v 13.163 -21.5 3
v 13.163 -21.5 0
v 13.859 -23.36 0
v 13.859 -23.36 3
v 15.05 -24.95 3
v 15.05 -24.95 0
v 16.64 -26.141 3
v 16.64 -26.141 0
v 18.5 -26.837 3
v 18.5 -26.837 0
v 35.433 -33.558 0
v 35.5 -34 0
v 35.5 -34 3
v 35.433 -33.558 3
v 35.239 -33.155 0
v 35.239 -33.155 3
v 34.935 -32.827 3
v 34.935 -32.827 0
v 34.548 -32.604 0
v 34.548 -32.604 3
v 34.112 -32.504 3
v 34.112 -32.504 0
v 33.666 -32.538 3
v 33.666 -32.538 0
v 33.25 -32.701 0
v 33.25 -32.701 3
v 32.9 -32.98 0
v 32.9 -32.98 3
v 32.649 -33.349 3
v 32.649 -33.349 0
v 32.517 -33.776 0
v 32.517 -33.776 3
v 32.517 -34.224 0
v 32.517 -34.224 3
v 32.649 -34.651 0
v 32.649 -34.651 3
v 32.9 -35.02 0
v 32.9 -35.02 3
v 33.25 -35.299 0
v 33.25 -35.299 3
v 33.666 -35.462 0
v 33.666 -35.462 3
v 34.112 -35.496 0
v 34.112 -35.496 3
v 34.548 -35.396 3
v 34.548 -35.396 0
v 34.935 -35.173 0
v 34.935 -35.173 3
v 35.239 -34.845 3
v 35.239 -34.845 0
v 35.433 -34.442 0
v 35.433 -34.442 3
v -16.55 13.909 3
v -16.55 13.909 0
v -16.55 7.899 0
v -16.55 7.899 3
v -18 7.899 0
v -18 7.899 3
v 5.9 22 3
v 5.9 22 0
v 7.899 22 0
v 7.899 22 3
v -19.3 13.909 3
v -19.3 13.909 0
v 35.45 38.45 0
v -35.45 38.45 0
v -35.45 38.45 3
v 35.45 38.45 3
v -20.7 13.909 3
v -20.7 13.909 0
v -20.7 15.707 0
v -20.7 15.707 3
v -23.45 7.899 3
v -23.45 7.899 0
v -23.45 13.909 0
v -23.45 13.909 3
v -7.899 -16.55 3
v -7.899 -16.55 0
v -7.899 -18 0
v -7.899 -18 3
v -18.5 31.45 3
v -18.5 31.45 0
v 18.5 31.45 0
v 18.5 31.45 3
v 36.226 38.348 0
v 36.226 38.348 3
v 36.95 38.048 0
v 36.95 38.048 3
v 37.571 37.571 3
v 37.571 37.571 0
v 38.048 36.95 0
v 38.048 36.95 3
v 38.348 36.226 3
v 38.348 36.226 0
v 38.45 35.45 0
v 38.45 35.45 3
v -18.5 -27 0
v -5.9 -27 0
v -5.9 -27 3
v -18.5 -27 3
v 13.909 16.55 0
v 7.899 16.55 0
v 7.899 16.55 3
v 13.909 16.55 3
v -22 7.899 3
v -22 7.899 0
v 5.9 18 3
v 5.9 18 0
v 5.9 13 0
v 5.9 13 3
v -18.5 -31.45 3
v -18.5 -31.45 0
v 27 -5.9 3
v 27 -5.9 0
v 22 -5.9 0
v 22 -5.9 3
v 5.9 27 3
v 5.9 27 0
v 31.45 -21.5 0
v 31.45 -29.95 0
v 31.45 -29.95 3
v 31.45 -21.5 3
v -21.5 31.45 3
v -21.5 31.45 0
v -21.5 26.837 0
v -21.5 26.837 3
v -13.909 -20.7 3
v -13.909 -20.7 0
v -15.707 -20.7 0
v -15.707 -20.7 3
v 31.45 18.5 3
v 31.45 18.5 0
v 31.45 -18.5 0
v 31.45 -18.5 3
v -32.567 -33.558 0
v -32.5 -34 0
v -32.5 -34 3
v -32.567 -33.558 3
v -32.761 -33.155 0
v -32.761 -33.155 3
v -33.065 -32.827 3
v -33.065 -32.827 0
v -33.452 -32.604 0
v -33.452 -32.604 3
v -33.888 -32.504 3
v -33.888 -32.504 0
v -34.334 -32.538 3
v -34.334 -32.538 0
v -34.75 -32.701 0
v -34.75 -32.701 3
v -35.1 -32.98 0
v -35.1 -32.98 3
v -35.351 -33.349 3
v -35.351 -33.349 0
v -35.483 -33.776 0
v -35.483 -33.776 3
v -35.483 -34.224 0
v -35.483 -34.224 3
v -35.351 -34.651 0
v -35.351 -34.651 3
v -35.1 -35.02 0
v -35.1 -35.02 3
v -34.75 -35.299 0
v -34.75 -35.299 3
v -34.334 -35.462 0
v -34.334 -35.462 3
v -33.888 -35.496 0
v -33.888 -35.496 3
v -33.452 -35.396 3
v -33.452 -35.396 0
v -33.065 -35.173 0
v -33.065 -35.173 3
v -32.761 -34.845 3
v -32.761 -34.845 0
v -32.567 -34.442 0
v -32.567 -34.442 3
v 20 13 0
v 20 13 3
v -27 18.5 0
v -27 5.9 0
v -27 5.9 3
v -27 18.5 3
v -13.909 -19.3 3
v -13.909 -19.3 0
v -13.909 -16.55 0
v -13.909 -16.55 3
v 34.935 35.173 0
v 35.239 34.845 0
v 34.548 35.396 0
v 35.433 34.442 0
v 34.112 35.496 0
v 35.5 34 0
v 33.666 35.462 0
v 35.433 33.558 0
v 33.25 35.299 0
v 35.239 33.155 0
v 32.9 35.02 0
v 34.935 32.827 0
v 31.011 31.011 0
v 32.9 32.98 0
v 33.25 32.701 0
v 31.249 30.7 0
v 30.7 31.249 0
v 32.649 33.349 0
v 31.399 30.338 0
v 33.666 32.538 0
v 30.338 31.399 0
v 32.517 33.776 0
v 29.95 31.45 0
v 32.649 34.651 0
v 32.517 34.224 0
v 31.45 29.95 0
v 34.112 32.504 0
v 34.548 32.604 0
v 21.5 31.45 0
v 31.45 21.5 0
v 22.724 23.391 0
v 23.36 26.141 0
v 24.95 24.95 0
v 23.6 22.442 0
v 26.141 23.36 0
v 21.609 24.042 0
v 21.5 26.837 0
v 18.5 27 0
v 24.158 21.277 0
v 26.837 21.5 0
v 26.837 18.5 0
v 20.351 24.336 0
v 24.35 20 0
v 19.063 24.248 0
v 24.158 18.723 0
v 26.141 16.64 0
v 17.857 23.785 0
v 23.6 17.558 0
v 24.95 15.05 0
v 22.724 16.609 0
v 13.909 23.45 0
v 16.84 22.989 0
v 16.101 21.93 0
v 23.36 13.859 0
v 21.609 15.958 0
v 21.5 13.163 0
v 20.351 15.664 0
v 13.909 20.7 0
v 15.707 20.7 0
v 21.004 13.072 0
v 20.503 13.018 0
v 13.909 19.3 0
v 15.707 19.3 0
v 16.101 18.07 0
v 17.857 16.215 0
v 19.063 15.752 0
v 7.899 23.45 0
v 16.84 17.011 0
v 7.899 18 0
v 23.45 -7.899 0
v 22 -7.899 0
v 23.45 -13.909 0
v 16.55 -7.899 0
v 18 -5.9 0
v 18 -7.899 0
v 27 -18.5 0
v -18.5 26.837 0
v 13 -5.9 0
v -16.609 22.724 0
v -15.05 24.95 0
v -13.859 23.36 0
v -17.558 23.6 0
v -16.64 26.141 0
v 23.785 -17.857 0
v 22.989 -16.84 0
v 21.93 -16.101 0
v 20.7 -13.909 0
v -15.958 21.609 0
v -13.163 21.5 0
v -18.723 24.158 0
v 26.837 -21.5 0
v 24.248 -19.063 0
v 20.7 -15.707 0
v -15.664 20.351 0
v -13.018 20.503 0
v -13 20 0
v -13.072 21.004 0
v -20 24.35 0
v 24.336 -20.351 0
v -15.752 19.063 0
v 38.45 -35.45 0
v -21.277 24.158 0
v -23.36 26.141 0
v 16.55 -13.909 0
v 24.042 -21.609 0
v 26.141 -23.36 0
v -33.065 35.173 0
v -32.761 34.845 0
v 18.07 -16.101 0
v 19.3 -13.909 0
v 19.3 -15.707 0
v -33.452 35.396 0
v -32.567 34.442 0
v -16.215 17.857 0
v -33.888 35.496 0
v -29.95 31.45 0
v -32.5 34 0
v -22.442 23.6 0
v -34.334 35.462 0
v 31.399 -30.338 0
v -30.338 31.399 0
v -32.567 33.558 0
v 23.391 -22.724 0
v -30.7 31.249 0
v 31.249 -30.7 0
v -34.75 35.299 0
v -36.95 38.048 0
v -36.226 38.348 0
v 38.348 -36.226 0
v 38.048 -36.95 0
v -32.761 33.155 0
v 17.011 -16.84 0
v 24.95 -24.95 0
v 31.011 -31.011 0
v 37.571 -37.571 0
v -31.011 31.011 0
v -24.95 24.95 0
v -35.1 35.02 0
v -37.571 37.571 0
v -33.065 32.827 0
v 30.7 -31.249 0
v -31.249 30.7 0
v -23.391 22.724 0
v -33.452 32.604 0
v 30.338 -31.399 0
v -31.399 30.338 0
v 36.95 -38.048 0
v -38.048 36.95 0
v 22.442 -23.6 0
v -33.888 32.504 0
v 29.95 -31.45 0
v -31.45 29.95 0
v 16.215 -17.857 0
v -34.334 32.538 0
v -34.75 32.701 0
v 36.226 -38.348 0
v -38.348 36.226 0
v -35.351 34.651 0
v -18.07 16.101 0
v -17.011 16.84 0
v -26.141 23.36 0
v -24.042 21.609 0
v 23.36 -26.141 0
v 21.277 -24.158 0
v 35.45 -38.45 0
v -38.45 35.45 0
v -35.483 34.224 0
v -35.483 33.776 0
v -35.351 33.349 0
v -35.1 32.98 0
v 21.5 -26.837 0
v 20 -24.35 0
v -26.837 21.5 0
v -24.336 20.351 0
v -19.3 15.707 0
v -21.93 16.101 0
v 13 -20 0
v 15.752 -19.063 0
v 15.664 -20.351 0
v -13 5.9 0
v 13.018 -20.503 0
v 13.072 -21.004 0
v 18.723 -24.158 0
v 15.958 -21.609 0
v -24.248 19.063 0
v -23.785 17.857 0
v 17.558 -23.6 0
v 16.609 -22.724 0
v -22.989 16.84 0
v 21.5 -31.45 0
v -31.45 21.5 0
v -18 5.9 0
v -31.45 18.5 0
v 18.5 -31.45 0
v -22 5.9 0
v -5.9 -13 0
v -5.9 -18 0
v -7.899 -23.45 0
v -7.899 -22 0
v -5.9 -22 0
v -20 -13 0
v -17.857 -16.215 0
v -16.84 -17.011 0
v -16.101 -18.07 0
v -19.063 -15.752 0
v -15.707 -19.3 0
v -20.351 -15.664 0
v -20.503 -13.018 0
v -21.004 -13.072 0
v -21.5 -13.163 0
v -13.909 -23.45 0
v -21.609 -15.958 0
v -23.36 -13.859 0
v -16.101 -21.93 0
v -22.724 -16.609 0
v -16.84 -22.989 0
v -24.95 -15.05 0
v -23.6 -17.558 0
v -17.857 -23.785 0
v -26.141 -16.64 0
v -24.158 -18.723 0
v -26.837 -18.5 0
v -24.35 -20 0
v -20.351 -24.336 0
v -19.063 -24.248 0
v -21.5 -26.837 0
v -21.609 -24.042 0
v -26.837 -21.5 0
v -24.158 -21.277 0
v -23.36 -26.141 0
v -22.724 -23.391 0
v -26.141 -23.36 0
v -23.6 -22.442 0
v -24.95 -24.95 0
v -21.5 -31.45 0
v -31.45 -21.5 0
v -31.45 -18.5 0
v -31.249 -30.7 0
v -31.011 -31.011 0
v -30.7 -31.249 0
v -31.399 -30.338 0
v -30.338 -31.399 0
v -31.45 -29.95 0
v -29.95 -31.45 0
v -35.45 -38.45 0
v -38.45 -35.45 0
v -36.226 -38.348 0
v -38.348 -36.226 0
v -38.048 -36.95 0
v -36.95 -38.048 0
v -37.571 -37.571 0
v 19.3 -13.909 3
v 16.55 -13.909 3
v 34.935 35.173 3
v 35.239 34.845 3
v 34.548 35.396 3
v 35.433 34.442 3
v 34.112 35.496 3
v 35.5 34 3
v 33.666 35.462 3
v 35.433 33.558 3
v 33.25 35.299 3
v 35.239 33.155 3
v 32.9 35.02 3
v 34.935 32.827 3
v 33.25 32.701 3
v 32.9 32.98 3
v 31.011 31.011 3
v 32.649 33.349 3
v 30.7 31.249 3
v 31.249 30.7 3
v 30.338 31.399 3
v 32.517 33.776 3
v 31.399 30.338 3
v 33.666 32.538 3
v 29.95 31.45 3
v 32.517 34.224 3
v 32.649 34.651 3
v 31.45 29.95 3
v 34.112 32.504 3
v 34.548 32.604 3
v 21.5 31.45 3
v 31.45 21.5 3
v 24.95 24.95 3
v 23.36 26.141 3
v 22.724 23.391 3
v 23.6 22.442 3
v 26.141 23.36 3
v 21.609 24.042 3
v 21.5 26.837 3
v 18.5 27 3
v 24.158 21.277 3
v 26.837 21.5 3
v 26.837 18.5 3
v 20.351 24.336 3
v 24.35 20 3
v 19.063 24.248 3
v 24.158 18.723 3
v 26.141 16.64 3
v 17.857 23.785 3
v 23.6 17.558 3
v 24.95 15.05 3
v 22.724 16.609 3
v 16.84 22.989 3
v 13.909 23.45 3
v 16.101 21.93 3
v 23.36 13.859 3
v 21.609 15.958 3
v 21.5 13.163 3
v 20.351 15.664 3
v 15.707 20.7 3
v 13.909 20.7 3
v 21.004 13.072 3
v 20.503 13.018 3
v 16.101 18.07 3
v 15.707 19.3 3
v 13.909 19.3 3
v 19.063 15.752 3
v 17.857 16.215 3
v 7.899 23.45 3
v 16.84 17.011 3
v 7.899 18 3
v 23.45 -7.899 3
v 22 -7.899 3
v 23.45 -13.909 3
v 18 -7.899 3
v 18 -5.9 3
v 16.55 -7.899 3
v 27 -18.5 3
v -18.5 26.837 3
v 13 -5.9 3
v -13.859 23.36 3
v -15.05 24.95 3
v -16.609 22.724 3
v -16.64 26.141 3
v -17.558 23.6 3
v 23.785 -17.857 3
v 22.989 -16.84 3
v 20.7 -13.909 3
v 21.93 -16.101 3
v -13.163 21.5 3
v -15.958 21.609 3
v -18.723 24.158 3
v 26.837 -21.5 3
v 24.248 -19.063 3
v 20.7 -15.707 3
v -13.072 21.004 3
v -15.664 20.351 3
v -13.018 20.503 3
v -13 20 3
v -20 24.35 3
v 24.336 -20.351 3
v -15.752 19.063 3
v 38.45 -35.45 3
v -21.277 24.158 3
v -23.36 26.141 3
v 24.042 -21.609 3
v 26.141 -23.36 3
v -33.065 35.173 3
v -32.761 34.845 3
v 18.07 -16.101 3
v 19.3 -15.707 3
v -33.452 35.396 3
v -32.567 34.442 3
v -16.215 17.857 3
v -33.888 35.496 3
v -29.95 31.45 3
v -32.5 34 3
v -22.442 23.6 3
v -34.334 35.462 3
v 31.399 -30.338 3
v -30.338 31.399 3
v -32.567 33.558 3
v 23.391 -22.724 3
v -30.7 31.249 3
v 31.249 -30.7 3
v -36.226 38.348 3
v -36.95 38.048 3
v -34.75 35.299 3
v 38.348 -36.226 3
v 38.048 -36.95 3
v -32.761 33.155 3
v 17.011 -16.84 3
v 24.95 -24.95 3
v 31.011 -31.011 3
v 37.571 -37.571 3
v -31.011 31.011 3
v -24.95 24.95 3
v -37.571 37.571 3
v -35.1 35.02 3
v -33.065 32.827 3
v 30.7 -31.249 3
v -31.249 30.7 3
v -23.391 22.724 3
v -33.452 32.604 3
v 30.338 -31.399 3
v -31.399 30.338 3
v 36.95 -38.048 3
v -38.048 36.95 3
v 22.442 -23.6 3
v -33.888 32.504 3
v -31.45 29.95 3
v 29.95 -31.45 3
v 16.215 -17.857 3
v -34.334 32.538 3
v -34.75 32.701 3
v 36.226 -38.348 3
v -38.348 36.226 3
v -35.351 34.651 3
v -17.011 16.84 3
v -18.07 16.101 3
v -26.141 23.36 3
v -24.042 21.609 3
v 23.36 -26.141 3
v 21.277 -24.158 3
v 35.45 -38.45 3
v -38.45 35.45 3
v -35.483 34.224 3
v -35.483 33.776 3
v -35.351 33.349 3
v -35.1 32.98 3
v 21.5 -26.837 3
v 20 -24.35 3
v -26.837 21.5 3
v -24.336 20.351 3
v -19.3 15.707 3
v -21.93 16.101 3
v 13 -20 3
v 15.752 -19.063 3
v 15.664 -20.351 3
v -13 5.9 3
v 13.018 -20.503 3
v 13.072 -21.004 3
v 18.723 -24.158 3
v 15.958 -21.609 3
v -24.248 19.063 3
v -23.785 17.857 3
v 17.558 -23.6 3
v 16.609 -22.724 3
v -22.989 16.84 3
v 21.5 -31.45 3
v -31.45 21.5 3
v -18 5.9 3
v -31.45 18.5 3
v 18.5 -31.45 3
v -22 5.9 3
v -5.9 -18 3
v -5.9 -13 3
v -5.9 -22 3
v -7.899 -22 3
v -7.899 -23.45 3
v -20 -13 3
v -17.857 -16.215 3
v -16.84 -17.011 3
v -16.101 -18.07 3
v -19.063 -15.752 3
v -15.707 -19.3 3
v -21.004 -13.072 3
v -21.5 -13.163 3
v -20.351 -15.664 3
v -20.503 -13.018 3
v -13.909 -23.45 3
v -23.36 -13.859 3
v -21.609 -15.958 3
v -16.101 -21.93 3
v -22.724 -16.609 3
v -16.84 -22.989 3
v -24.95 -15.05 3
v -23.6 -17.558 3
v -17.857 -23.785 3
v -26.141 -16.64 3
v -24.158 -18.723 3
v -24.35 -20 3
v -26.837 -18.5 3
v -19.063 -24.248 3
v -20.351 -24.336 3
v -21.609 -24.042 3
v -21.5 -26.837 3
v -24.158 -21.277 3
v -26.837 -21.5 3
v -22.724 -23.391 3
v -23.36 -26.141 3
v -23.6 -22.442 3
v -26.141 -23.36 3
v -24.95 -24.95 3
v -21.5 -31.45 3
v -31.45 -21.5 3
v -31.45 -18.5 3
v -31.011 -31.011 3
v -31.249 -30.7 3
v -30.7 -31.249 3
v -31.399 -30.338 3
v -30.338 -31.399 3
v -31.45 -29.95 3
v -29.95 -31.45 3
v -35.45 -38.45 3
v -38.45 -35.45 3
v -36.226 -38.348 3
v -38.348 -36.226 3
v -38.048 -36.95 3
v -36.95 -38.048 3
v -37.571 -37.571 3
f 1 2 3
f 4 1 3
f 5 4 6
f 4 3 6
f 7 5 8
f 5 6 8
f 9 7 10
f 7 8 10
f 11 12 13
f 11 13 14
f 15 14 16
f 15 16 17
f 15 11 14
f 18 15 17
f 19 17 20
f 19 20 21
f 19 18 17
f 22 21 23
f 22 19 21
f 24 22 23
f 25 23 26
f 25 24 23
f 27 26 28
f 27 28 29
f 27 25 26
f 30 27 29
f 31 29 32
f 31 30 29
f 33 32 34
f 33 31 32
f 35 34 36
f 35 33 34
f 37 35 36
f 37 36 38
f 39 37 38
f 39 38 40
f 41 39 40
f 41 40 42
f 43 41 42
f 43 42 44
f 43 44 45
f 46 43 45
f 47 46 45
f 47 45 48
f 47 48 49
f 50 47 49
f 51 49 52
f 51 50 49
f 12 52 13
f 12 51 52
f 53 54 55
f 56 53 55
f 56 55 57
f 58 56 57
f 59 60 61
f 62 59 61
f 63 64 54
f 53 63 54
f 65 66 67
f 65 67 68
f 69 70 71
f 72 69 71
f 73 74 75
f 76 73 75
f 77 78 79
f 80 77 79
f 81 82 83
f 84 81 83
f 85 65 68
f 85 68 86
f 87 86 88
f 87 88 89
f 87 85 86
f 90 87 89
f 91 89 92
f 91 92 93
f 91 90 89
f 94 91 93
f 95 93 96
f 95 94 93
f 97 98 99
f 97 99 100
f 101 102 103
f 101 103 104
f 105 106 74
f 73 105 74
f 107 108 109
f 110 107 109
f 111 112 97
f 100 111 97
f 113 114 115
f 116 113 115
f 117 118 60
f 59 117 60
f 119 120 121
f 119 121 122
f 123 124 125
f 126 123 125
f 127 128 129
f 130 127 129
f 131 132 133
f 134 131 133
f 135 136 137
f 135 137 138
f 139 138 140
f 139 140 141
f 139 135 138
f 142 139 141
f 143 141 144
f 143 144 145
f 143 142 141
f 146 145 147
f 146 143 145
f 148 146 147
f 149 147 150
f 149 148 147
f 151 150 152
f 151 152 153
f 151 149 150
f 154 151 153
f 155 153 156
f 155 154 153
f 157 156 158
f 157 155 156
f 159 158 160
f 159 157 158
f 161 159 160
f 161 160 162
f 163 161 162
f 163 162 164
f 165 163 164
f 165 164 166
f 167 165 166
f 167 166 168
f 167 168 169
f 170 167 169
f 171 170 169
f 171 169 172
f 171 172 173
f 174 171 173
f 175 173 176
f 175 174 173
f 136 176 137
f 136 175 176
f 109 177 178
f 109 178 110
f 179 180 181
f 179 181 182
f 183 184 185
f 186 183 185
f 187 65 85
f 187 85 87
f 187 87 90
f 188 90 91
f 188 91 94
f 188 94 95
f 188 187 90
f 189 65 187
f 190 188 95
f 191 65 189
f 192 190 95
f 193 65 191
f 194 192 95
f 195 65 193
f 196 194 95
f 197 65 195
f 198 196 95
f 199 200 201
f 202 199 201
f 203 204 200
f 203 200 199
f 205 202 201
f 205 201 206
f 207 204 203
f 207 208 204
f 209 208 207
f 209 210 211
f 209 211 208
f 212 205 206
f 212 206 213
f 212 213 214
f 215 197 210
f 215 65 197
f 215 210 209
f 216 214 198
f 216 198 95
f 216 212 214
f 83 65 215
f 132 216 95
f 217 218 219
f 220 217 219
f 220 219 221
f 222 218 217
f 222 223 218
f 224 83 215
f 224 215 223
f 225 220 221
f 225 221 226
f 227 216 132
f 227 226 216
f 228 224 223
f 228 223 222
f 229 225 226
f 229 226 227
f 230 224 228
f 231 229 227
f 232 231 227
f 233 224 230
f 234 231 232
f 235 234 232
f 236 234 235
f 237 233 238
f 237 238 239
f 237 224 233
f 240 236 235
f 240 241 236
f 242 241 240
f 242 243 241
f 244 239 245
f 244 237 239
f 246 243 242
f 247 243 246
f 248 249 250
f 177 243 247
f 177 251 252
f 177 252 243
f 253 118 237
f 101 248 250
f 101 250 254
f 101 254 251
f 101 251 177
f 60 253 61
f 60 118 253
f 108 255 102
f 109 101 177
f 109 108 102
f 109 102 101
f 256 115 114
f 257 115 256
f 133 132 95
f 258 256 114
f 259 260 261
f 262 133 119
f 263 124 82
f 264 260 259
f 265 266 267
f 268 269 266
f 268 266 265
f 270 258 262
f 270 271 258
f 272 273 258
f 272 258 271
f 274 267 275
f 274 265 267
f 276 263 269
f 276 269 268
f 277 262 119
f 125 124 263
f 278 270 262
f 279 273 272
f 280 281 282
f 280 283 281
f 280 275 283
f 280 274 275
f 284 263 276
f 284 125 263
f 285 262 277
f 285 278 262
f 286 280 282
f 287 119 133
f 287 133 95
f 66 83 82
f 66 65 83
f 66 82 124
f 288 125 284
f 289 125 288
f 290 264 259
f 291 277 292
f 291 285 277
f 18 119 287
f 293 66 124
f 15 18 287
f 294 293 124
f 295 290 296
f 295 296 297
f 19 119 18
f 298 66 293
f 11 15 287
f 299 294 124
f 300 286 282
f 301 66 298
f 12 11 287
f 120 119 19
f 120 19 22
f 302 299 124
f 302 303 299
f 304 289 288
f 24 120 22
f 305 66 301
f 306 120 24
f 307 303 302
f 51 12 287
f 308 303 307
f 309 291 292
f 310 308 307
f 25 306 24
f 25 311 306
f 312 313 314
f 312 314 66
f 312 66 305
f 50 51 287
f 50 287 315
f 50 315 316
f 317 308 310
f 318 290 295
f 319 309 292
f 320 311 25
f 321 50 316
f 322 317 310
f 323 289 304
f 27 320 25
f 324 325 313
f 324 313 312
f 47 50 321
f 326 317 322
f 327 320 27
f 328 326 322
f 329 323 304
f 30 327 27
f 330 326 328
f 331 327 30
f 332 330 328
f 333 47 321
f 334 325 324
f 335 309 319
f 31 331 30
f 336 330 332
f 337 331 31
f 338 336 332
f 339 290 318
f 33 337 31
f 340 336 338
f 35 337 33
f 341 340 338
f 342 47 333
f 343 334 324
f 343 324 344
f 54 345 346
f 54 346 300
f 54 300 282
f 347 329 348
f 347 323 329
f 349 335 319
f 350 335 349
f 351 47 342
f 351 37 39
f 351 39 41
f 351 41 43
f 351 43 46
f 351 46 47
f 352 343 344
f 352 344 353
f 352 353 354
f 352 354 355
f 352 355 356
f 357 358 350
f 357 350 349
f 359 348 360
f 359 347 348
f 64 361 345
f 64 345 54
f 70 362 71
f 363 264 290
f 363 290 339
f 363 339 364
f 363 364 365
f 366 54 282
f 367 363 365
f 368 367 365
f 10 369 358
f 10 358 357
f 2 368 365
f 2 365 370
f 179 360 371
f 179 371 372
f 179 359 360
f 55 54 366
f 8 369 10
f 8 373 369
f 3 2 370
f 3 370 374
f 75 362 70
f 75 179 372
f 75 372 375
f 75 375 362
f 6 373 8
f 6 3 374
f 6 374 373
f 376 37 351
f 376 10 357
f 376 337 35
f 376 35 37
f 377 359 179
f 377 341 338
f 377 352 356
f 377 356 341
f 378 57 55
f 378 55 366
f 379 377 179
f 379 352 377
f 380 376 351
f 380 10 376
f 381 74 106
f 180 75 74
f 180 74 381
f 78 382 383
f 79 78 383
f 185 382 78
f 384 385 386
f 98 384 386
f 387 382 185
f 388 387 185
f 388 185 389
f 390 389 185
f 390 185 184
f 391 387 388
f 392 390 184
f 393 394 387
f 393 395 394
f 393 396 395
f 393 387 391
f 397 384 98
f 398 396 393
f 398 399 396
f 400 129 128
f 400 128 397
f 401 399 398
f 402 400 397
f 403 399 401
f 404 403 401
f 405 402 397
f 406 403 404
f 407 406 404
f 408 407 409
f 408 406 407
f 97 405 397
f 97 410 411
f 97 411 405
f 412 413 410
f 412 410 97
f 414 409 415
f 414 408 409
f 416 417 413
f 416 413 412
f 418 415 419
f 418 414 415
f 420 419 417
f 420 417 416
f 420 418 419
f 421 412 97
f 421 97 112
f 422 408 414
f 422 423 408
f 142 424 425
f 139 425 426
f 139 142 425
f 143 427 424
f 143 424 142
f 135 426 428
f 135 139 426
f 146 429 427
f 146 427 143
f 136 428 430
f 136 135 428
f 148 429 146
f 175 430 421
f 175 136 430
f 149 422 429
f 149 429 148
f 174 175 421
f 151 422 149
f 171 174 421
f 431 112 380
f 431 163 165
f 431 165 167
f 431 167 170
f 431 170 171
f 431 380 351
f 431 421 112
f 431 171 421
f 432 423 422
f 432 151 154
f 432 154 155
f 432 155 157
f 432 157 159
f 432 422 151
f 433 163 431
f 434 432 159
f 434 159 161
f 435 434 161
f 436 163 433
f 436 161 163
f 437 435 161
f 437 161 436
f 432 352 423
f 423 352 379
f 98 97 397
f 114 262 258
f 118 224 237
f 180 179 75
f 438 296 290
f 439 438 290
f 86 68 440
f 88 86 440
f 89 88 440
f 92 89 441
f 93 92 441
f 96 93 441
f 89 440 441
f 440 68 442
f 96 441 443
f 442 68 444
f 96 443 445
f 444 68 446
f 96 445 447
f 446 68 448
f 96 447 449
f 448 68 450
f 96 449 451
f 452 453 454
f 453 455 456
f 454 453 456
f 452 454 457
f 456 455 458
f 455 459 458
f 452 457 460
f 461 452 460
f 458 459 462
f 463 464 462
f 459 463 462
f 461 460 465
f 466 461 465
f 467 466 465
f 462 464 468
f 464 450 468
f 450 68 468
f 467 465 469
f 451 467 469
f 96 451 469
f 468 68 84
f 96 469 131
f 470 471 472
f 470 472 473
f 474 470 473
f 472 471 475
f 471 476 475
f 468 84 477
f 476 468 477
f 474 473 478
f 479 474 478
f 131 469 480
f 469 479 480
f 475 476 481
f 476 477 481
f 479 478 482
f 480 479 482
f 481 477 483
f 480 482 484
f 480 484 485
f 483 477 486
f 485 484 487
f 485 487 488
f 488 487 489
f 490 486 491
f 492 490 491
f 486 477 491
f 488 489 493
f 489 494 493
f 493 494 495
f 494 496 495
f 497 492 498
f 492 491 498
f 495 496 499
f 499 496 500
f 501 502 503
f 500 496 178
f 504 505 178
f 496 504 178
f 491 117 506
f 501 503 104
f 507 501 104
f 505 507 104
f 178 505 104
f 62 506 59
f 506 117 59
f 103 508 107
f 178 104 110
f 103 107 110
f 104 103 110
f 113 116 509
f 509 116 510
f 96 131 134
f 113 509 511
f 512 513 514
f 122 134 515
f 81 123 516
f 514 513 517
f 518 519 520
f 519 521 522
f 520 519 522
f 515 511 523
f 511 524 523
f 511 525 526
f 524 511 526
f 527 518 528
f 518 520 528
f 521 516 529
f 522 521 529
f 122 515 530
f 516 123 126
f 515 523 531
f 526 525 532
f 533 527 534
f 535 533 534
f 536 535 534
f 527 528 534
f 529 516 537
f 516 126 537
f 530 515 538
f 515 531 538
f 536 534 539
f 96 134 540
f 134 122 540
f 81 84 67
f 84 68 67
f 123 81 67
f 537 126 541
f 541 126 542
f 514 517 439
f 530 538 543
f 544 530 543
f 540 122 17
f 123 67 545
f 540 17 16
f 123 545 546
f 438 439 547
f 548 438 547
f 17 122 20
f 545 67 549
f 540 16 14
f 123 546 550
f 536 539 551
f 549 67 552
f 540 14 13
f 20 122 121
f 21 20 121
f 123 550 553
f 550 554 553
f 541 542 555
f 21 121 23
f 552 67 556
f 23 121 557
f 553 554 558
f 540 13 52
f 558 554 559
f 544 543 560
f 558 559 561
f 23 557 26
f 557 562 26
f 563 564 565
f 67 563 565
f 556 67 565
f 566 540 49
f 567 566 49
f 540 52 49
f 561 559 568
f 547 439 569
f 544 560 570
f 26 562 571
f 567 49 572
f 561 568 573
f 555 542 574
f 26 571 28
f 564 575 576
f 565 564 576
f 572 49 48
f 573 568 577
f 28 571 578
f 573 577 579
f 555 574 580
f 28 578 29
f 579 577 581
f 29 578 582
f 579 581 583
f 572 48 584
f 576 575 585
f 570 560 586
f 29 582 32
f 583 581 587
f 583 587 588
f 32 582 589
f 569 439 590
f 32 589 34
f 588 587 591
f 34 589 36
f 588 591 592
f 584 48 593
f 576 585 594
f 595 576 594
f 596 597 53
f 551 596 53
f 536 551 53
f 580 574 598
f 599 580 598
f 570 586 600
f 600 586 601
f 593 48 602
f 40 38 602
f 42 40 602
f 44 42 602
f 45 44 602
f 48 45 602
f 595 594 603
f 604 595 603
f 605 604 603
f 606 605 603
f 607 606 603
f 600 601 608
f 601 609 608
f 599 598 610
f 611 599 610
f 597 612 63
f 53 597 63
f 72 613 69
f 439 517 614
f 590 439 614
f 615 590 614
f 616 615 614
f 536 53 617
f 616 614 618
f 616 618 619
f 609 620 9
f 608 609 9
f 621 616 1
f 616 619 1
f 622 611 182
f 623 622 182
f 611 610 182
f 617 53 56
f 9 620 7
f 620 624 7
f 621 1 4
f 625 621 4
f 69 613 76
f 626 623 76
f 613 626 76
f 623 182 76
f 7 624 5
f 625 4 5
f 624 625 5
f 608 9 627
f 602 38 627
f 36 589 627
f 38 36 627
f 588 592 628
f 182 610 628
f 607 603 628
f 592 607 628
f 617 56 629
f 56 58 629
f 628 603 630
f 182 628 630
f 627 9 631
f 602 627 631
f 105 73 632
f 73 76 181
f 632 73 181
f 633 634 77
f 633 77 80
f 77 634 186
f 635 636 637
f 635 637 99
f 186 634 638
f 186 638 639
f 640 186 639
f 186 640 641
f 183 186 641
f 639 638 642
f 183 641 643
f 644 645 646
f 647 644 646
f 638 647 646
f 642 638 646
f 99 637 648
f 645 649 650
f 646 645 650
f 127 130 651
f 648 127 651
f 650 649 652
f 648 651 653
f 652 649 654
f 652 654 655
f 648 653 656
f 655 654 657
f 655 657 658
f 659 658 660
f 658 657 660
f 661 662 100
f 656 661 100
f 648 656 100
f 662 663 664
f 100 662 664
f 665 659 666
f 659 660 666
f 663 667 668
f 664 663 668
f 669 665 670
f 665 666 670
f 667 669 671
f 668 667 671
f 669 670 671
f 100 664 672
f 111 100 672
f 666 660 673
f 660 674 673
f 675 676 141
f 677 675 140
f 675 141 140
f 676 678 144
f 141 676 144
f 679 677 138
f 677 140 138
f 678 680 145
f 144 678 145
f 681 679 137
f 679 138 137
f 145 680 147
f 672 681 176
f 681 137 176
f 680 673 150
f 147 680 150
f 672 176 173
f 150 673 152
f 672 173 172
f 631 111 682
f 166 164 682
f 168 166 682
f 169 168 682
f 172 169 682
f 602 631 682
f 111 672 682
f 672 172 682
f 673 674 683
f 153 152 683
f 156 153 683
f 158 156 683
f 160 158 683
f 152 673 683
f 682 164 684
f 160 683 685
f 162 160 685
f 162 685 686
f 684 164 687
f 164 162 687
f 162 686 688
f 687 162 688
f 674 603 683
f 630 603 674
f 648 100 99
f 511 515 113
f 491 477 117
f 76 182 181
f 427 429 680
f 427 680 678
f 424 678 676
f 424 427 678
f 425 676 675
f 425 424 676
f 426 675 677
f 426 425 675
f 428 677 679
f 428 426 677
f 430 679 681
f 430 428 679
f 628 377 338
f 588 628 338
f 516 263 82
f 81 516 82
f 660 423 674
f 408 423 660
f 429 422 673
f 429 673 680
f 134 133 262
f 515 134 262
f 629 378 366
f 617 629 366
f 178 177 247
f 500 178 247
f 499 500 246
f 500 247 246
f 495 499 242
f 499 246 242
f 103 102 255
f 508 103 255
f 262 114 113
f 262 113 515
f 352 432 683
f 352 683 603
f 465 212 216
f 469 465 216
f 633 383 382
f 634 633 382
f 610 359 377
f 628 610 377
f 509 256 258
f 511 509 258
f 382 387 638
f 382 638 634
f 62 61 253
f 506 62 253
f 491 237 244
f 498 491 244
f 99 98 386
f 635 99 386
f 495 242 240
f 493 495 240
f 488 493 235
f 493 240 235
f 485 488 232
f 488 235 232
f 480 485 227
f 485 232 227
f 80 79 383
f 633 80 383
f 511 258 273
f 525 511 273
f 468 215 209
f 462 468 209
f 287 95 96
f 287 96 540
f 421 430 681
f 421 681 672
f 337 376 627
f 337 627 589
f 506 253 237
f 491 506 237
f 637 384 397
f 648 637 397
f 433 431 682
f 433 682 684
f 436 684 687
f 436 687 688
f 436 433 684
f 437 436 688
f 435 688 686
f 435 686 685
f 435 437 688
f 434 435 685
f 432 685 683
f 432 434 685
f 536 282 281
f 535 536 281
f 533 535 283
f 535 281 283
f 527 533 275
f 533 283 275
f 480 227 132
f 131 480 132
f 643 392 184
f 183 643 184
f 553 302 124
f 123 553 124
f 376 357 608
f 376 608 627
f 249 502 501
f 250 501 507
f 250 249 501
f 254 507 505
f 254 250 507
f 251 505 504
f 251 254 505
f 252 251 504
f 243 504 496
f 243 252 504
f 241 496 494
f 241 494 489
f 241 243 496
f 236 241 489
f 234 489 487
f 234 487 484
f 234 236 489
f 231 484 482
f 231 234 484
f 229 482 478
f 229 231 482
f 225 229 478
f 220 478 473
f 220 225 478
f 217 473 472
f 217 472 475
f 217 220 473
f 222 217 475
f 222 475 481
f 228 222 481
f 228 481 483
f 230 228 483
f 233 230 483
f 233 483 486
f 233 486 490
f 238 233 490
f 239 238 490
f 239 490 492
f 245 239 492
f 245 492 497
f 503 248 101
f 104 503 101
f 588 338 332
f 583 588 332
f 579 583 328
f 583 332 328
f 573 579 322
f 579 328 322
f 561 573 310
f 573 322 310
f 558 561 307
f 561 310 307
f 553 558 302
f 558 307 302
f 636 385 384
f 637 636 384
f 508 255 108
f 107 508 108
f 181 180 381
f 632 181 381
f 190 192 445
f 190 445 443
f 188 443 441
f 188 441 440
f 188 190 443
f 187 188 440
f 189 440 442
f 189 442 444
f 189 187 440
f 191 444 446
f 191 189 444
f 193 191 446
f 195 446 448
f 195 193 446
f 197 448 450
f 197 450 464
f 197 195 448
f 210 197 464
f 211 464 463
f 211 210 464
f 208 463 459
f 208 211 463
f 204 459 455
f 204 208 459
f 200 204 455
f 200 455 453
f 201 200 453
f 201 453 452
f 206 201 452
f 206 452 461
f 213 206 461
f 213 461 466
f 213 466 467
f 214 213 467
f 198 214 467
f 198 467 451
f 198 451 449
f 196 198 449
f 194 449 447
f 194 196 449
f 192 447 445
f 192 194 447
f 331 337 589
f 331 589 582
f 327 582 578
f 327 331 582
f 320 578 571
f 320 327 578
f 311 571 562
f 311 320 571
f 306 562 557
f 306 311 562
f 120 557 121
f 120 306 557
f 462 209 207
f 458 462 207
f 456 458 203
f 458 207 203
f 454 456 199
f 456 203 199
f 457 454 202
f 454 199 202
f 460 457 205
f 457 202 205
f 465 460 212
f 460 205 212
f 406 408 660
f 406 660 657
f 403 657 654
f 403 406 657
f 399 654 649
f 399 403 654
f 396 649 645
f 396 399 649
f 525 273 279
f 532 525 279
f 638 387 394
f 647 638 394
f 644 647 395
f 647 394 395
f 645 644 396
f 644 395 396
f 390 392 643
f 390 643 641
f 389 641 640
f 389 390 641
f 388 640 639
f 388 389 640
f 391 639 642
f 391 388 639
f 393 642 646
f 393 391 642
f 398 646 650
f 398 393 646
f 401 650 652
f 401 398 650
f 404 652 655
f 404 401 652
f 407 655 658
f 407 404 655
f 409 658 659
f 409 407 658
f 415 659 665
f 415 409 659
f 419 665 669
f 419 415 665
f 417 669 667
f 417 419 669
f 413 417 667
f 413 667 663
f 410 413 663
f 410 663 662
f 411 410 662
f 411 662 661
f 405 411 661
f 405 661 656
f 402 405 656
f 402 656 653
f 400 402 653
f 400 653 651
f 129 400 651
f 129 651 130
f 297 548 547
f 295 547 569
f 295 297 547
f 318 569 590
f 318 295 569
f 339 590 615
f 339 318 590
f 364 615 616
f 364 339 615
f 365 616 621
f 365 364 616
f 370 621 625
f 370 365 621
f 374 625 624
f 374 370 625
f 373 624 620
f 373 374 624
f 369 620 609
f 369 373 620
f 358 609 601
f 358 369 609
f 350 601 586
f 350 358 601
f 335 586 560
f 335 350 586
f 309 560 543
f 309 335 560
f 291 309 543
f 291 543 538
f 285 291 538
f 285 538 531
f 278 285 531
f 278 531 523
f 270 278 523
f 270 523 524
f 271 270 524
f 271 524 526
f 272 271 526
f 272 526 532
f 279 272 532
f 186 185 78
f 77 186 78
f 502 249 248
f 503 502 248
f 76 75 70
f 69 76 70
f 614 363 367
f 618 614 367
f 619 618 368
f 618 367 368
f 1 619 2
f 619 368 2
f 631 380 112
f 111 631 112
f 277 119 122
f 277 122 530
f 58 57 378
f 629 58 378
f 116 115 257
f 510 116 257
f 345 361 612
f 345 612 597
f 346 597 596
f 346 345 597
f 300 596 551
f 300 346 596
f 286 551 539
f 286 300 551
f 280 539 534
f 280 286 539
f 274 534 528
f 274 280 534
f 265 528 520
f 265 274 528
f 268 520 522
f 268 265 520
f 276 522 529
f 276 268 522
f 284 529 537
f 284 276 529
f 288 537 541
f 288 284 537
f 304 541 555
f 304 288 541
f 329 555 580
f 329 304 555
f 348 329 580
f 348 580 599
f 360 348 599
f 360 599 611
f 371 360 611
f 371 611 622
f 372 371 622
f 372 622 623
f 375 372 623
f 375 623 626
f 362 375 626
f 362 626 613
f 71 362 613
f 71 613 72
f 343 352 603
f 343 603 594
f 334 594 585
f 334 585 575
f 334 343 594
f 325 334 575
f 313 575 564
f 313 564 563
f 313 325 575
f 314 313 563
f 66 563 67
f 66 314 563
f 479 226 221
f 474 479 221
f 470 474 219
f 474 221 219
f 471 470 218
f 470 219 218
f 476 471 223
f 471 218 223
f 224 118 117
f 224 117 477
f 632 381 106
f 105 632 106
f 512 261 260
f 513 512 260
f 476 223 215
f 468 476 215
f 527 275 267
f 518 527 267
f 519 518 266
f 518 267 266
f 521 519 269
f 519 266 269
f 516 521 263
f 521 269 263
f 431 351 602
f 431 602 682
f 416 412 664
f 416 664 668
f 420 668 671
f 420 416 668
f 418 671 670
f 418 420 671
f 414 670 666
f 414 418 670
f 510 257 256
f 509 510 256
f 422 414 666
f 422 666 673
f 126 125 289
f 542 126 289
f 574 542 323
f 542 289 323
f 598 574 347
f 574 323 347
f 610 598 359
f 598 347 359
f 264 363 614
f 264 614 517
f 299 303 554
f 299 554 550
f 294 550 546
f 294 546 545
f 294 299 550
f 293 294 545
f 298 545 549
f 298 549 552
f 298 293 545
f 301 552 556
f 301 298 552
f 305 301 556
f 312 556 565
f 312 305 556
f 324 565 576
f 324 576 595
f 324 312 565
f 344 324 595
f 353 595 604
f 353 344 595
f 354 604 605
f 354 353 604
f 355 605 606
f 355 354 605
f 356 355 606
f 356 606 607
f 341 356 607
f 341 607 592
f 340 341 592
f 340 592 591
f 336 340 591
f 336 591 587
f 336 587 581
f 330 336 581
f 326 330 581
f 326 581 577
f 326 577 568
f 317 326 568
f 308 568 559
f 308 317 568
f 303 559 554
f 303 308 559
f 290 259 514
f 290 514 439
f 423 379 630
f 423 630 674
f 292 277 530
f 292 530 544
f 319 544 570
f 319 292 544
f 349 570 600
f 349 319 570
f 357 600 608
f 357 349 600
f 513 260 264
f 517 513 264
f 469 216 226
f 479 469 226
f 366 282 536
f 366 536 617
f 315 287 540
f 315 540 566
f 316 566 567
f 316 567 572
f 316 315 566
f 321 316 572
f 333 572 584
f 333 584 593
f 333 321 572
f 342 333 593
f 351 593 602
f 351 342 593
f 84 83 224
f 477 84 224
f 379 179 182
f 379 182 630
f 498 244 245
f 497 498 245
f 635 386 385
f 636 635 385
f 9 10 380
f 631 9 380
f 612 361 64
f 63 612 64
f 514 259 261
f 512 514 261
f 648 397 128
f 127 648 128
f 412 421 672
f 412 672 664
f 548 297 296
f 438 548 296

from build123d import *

# Parameters (mm, degrees)
SKETCH_1_R               = 1.5
SKETCH_1_R_2             = 4.35
EXTRUDE_1_DEPTH          = 3
EXTRUDE_3_DEPTH          = 3
CUT_EXTRUDE_2_DEPTH      = 55.459204915
PATTERN_CIRCULAR_2_COUNT = 4


with BuildPart() as part:
    # 草圖1 → 填料-伸長1 (new body)
    with BuildSketch(Plane.XY):
        with BuildLine():
            Line((35.45, 38.45), (-35.45, 38.45))
            ThreePointArc((-35.45, 38.45), (-37.571320344, 37.571320344), (-38.45, 35.45))
            Line((-38.45, 35.45), (-38.45, -35.45))
            ThreePointArc((-38.45, -35.45), (-37.571320344, -37.571320344), (-35.45, -38.45))
            Line((-35.45, -38.45), (35.45, -38.45))
            ThreePointArc((35.45, -38.45), (37.571320344, -37.571320344), (38.45, -35.45))
            Line((38.45, -35.45), (38.45, 35.45))
            ThreePointArc((38.45, 35.45), (37.571320344, 37.571320344), (35.45, 38.45))
        make_face()
        with Locations((-34, -34)):
            Circle(SKETCH_1_R, mode=Mode.SUBTRACT)
        with BuildLine():
            Line((-21.5, -31.45), (-29.95, -31.45))
            ThreePointArc((-29.95, -31.45), (-31.010660172, -31.010660172), (-31.45, -29.95))
            Line((-31.45, -29.95), (-31.45, -21.5))
            Line((-31.45, -21.5), (-26.837397166, -21.5))
            ThreePointArc((-26.837397166, -21.5), (-24.949747468, -24.949747468), (-21.5, -26.837397166))
            Line((-21.5, -26.837397166), (-21.5, -31.45))
        make_face(mode=Mode.SUBTRACT)
        with Locations((-20, -20)):
            Circle(SKETCH_1_R_2, mode=Mode.SUBTRACT)
        with BuildLine():
            Line((18.5, -31.45), (-18.5, -31.45))
            Line((-18.5, -31.45), (-18.5, -26.837397166))
            ThreePointArc((-18.5, -26.837397166), (-15.050252532, -24.949747468), (-13.162602834, -21.5))
            Line((-13.162602834, -21.5), (13.162602834, -21.5))
            ThreePointArc((13.162602834, -21.5), (15.050252532, -24.949747468), (18.5, -26.837397166))
            Line((18.5, -26.837397166), (18.5, -31.45))
        make_face(mode=Mode.SUBTRACT)
        with Locations((34, -34)):
            Circle(SKETCH_1_R, mode=Mode.SUBTRACT)
        with BuildLine():
            Line((21.5, -31.45), (21.5, -26.837397166))
            ThreePointArc((21.5, -26.837397166), (24.949747468, -24.949747468), (26.837397166, -21.5))
            Line((26.837397166, -21.5), (31.45, -21.5))
            Line((31.45, -21.5), (31.45, -29.95))
            ThreePointArc((31.45, -29.95), (31.010660172, -31.010660172), (29.95, -31.45))
            Line((29.95, -31.45), (21.5, -31.45))
        make_face(mode=Mode.SUBTRACT)
        with Locations((20, -20)):
            Circle(SKETCH_1_R_2, mode=Mode.SUBTRACT)
        with BuildLine():
            Line((-31.45, -18.5), (-31.45, 18.5))
            Line((-31.45, 18.5), (-26.837397166, 18.5))
            ThreePointArc((-26.837397166, 18.5), (-24.949747468, 15.050252532), (-21.5, 13.162602834))
            Line((-21.5, 13.162602834), (-21.5, -13.162602834))
            ThreePointArc((-21.5, -13.162602834), (-24.949747468, -15.050252532), (-26.837397166, -18.5))
            Line((-26.837397166, -18.5), (-31.45, -18.5))
        make_face(mode=Mode.SUBTRACT)
        with Locations((-20, 20)):
            Circle(SKETCH_1_R_2, mode=Mode.SUBTRACT)
        with BuildLine():
            ThreePointArc((-31.45, 29.95), (-31.010660172, 31.010660172), (-29.95, 31.45))
            Line((-29.95, 31.45), (-21.5, 31.45))
            Line((-21.5, 31.45), (-21.5, 26.837397166))
            ThreePointArc((-21.5, 26.837397166), (-24.949747468, 24.949747468), (-26.837397166, 21.5))
            Line((-26.837397166, 21.5), (-31.45, 21.5))
            Line((-31.45, 21.5), (-31.45, 29.95))
        make_face(mode=Mode.SUBTRACT)
        with Locations((-34, 34)):
            Circle(SKETCH_1_R, mode=Mode.SUBTRACT)
        with BuildLine():
            ThreePointArc((-18.5, 13.162602834), (-15.050252532, 15.050252532), (-13.162602834, 18.5))
            Line((-13.162602834, 18.5), (13.162602834, 18.5))
            ThreePointArc((13.162602834, 18.5), (15.050252532, 15.050252532), (18.5, 13.162602834))
            Line((18.5, 13.162602834), (18.5, -13.162602834))
            ThreePointArc((18.5, -13.162602834), (15.050252532, -15.050252532), (13.162602834, -18.5))
            Line((13.162602834, -18.5), (-13.162602834, -18.5))
            ThreePointArc((-13.162602834, -18.5), (-15.050252532, -15.050252532), (-18.5, -13.162602834))
            Line((-18.5, -13.162602834), (-18.5, 13.162602834))
        make_face(mode=Mode.SUBTRACT)
        with BuildLine():
            ThreePointArc((21.5, 13.162602834), (24.949747468, 15.050252532), (26.837397166, 18.5))
            Line((26.837397166, 18.5), (31.45, 18.5))
            Line((31.45, 18.5), (31.45, -18.5))
            Line((31.45, -18.5), (26.837397166, -18.5))
            ThreePointArc((26.837397166, -18.5), (24.949747468, -15.050252532), (21.5, -13.162602834))
            Line((21.5, -13.162602834), (21.5, 13.162602834))
        make_face(mode=Mode.SUBTRACT)
        with BuildLine():
            Line((-18.5, 26.837397166), (-18.5, 31.45))
            Line((-18.5, 31.45), (18.5, 31.45))
            Line((18.5, 31.45), (18.5, 26.837397166))
            ThreePointArc((18.5, 26.837397166), (15.050252532, 24.949747468), (13.162602834, 21.5))
            Line((13.162602834, 21.5), (-13.162602834, 21.5))
            ThreePointArc((-13.162602834, 21.5), (-15.050252532, 24.949747468), (-18.5, 26.837397166))
        make_face(mode=Mode.SUBTRACT)
        with Locations((20, 20)):
            Circle(SKETCH_1_R_2, mode=Mode.SUBTRACT)
        with BuildLine():
            ThreePointArc((29.95, 31.45), (31.010660172, 31.010660172), (31.45, 29.95))
            Line((31.45, 29.95), (31.45, 21.5))
            Line((31.45, 21.5), (26.837397166, 21.5))
            ThreePointArc((26.837397166, 21.5), (24.949747468, 24.949747468), (21.5, 26.837397166))
            Line((21.5, 26.837397166), (21.5, 31.45))
            Line((21.5, 31.45), (29.95, 31.45))
        make_face(mode=Mode.SUBTRACT)
        with Locations((34, 34)):
            Circle(SKETCH_1_R, mode=Mode.SUBTRACT)
    extrude(amount=EXTRUDE_1_DEPTH)

    # 草圖2 → 填料-伸長3 (add)
    with BuildSketch(Plane(origin=(0, 0, 0), x_dir=(-1, 0, 0), z_dir=(0, 0, -1))):
        with BuildLine():
            ThreePointArc((16.55, 13.909228292), (13.952273154, 16.475088654), (13, 20))
            Line((13, 20), (13, 5.9))
            Line((13, 5.9), (15.009228292, 3.9))
            Line((15.009228292, 3.9), (24.990771708, 3.9))
            Line((24.990771708, 3.9), (27, 5.9))
            Line((27, 5.9), (27, 20))
            ThreePointArc((27, 20), (26.047726846, 16.475088654), (23.45, 13.909228292))
            Line((23.45, 13.909228292), (23.45, 7.9))
            Line((23.45, 7.9), (16.55, 7.9))
            Line((16.55, 7.9), (16.55, 13.909228292))
        make_face()
    extrude_3 = extrude(amount=-EXTRUDE_3_DEPTH)

    # 草圖4 → 除料-伸長2 (cut, through all)
    with BuildSketch(Plane(origin=(0, 0, 0), x_dir=(-1, 0, 0), z_dir=(0, 0, -1))):
        with BuildLine():
            Line((16.55, 13.909228292), (16.55, 7.899228292))
            Line((16.55, 7.899228292), (18, 7.899228292))
            Line((18, 7.899228292), (18, 5.9))
            Line((18, 5.9), (13, 5.9))
            Line((13, 5.9), (13, -2.100771708))
            Line((13, -2.100771708), (18.5, -2.100771708))
            Line((18.5, -2.100771708), (18.5, -13))
            Line((18.5, -13), (20, -13))
            ThreePointArc((20, -13), (20.754393744, -13.040769433), (21.5, -13.162602834))
            Line((21.5, -13.162602834), (21.5, -2.100771708))
            Line((21.5, -2.100771708), (31.45, -2.100771708))
            Line((31.45, -2.100771708), (31.45, 5.9))
            Line((31.45, 5.9), (22, 5.9))
            Line((22, 5.9), (22, 7.899228292))
            Line((22, 7.899228292), (23.45, 7.899228292))
            Line((23.45, 7.899228292), (23.45, 13.909228292))
            Line((23.45, 13.909228292), (20.7, 13.909228292))
            Line((20.7, 13.909228292), (20.7, 16.409228292))
            Line((20.7, 16.409228292), (19.3, 16.409228292))
            Line((19.3, 16.409228292), (19.3, 13.909228292))
            Line((19.3, 13.909228292), (16.55, 13.909228292))
        make_face()
    cut_extrude_2 = extrude(amount=-CUT_EXTRUDE_2_DEPTH, mode=Mode.SUBTRACT)

    # 環狀複製排列2: 填料-伸長3, 除料-伸長2 ×4 about axis
    pattern_circular_2_axis = Axis((0, 0, -0.15), (0, 0, 1))
    add([extrude_3.rotate(pattern_circular_2_axis, i * 360 / PATTERN_CIRCULAR_2_COUNT) for i in range(1, PATTERN_CIRCULAR_2_COUNT)])
    add([cut_extrude_2.rotate(pattern_circular_2_axis, i * 360 / PATTERN_CIRCULAR_2_COUNT) for i in range(1, PATTERN_CIRCULAR_2_COUNT)], mode=Mode.SUBTRACT)


solid = part.part
